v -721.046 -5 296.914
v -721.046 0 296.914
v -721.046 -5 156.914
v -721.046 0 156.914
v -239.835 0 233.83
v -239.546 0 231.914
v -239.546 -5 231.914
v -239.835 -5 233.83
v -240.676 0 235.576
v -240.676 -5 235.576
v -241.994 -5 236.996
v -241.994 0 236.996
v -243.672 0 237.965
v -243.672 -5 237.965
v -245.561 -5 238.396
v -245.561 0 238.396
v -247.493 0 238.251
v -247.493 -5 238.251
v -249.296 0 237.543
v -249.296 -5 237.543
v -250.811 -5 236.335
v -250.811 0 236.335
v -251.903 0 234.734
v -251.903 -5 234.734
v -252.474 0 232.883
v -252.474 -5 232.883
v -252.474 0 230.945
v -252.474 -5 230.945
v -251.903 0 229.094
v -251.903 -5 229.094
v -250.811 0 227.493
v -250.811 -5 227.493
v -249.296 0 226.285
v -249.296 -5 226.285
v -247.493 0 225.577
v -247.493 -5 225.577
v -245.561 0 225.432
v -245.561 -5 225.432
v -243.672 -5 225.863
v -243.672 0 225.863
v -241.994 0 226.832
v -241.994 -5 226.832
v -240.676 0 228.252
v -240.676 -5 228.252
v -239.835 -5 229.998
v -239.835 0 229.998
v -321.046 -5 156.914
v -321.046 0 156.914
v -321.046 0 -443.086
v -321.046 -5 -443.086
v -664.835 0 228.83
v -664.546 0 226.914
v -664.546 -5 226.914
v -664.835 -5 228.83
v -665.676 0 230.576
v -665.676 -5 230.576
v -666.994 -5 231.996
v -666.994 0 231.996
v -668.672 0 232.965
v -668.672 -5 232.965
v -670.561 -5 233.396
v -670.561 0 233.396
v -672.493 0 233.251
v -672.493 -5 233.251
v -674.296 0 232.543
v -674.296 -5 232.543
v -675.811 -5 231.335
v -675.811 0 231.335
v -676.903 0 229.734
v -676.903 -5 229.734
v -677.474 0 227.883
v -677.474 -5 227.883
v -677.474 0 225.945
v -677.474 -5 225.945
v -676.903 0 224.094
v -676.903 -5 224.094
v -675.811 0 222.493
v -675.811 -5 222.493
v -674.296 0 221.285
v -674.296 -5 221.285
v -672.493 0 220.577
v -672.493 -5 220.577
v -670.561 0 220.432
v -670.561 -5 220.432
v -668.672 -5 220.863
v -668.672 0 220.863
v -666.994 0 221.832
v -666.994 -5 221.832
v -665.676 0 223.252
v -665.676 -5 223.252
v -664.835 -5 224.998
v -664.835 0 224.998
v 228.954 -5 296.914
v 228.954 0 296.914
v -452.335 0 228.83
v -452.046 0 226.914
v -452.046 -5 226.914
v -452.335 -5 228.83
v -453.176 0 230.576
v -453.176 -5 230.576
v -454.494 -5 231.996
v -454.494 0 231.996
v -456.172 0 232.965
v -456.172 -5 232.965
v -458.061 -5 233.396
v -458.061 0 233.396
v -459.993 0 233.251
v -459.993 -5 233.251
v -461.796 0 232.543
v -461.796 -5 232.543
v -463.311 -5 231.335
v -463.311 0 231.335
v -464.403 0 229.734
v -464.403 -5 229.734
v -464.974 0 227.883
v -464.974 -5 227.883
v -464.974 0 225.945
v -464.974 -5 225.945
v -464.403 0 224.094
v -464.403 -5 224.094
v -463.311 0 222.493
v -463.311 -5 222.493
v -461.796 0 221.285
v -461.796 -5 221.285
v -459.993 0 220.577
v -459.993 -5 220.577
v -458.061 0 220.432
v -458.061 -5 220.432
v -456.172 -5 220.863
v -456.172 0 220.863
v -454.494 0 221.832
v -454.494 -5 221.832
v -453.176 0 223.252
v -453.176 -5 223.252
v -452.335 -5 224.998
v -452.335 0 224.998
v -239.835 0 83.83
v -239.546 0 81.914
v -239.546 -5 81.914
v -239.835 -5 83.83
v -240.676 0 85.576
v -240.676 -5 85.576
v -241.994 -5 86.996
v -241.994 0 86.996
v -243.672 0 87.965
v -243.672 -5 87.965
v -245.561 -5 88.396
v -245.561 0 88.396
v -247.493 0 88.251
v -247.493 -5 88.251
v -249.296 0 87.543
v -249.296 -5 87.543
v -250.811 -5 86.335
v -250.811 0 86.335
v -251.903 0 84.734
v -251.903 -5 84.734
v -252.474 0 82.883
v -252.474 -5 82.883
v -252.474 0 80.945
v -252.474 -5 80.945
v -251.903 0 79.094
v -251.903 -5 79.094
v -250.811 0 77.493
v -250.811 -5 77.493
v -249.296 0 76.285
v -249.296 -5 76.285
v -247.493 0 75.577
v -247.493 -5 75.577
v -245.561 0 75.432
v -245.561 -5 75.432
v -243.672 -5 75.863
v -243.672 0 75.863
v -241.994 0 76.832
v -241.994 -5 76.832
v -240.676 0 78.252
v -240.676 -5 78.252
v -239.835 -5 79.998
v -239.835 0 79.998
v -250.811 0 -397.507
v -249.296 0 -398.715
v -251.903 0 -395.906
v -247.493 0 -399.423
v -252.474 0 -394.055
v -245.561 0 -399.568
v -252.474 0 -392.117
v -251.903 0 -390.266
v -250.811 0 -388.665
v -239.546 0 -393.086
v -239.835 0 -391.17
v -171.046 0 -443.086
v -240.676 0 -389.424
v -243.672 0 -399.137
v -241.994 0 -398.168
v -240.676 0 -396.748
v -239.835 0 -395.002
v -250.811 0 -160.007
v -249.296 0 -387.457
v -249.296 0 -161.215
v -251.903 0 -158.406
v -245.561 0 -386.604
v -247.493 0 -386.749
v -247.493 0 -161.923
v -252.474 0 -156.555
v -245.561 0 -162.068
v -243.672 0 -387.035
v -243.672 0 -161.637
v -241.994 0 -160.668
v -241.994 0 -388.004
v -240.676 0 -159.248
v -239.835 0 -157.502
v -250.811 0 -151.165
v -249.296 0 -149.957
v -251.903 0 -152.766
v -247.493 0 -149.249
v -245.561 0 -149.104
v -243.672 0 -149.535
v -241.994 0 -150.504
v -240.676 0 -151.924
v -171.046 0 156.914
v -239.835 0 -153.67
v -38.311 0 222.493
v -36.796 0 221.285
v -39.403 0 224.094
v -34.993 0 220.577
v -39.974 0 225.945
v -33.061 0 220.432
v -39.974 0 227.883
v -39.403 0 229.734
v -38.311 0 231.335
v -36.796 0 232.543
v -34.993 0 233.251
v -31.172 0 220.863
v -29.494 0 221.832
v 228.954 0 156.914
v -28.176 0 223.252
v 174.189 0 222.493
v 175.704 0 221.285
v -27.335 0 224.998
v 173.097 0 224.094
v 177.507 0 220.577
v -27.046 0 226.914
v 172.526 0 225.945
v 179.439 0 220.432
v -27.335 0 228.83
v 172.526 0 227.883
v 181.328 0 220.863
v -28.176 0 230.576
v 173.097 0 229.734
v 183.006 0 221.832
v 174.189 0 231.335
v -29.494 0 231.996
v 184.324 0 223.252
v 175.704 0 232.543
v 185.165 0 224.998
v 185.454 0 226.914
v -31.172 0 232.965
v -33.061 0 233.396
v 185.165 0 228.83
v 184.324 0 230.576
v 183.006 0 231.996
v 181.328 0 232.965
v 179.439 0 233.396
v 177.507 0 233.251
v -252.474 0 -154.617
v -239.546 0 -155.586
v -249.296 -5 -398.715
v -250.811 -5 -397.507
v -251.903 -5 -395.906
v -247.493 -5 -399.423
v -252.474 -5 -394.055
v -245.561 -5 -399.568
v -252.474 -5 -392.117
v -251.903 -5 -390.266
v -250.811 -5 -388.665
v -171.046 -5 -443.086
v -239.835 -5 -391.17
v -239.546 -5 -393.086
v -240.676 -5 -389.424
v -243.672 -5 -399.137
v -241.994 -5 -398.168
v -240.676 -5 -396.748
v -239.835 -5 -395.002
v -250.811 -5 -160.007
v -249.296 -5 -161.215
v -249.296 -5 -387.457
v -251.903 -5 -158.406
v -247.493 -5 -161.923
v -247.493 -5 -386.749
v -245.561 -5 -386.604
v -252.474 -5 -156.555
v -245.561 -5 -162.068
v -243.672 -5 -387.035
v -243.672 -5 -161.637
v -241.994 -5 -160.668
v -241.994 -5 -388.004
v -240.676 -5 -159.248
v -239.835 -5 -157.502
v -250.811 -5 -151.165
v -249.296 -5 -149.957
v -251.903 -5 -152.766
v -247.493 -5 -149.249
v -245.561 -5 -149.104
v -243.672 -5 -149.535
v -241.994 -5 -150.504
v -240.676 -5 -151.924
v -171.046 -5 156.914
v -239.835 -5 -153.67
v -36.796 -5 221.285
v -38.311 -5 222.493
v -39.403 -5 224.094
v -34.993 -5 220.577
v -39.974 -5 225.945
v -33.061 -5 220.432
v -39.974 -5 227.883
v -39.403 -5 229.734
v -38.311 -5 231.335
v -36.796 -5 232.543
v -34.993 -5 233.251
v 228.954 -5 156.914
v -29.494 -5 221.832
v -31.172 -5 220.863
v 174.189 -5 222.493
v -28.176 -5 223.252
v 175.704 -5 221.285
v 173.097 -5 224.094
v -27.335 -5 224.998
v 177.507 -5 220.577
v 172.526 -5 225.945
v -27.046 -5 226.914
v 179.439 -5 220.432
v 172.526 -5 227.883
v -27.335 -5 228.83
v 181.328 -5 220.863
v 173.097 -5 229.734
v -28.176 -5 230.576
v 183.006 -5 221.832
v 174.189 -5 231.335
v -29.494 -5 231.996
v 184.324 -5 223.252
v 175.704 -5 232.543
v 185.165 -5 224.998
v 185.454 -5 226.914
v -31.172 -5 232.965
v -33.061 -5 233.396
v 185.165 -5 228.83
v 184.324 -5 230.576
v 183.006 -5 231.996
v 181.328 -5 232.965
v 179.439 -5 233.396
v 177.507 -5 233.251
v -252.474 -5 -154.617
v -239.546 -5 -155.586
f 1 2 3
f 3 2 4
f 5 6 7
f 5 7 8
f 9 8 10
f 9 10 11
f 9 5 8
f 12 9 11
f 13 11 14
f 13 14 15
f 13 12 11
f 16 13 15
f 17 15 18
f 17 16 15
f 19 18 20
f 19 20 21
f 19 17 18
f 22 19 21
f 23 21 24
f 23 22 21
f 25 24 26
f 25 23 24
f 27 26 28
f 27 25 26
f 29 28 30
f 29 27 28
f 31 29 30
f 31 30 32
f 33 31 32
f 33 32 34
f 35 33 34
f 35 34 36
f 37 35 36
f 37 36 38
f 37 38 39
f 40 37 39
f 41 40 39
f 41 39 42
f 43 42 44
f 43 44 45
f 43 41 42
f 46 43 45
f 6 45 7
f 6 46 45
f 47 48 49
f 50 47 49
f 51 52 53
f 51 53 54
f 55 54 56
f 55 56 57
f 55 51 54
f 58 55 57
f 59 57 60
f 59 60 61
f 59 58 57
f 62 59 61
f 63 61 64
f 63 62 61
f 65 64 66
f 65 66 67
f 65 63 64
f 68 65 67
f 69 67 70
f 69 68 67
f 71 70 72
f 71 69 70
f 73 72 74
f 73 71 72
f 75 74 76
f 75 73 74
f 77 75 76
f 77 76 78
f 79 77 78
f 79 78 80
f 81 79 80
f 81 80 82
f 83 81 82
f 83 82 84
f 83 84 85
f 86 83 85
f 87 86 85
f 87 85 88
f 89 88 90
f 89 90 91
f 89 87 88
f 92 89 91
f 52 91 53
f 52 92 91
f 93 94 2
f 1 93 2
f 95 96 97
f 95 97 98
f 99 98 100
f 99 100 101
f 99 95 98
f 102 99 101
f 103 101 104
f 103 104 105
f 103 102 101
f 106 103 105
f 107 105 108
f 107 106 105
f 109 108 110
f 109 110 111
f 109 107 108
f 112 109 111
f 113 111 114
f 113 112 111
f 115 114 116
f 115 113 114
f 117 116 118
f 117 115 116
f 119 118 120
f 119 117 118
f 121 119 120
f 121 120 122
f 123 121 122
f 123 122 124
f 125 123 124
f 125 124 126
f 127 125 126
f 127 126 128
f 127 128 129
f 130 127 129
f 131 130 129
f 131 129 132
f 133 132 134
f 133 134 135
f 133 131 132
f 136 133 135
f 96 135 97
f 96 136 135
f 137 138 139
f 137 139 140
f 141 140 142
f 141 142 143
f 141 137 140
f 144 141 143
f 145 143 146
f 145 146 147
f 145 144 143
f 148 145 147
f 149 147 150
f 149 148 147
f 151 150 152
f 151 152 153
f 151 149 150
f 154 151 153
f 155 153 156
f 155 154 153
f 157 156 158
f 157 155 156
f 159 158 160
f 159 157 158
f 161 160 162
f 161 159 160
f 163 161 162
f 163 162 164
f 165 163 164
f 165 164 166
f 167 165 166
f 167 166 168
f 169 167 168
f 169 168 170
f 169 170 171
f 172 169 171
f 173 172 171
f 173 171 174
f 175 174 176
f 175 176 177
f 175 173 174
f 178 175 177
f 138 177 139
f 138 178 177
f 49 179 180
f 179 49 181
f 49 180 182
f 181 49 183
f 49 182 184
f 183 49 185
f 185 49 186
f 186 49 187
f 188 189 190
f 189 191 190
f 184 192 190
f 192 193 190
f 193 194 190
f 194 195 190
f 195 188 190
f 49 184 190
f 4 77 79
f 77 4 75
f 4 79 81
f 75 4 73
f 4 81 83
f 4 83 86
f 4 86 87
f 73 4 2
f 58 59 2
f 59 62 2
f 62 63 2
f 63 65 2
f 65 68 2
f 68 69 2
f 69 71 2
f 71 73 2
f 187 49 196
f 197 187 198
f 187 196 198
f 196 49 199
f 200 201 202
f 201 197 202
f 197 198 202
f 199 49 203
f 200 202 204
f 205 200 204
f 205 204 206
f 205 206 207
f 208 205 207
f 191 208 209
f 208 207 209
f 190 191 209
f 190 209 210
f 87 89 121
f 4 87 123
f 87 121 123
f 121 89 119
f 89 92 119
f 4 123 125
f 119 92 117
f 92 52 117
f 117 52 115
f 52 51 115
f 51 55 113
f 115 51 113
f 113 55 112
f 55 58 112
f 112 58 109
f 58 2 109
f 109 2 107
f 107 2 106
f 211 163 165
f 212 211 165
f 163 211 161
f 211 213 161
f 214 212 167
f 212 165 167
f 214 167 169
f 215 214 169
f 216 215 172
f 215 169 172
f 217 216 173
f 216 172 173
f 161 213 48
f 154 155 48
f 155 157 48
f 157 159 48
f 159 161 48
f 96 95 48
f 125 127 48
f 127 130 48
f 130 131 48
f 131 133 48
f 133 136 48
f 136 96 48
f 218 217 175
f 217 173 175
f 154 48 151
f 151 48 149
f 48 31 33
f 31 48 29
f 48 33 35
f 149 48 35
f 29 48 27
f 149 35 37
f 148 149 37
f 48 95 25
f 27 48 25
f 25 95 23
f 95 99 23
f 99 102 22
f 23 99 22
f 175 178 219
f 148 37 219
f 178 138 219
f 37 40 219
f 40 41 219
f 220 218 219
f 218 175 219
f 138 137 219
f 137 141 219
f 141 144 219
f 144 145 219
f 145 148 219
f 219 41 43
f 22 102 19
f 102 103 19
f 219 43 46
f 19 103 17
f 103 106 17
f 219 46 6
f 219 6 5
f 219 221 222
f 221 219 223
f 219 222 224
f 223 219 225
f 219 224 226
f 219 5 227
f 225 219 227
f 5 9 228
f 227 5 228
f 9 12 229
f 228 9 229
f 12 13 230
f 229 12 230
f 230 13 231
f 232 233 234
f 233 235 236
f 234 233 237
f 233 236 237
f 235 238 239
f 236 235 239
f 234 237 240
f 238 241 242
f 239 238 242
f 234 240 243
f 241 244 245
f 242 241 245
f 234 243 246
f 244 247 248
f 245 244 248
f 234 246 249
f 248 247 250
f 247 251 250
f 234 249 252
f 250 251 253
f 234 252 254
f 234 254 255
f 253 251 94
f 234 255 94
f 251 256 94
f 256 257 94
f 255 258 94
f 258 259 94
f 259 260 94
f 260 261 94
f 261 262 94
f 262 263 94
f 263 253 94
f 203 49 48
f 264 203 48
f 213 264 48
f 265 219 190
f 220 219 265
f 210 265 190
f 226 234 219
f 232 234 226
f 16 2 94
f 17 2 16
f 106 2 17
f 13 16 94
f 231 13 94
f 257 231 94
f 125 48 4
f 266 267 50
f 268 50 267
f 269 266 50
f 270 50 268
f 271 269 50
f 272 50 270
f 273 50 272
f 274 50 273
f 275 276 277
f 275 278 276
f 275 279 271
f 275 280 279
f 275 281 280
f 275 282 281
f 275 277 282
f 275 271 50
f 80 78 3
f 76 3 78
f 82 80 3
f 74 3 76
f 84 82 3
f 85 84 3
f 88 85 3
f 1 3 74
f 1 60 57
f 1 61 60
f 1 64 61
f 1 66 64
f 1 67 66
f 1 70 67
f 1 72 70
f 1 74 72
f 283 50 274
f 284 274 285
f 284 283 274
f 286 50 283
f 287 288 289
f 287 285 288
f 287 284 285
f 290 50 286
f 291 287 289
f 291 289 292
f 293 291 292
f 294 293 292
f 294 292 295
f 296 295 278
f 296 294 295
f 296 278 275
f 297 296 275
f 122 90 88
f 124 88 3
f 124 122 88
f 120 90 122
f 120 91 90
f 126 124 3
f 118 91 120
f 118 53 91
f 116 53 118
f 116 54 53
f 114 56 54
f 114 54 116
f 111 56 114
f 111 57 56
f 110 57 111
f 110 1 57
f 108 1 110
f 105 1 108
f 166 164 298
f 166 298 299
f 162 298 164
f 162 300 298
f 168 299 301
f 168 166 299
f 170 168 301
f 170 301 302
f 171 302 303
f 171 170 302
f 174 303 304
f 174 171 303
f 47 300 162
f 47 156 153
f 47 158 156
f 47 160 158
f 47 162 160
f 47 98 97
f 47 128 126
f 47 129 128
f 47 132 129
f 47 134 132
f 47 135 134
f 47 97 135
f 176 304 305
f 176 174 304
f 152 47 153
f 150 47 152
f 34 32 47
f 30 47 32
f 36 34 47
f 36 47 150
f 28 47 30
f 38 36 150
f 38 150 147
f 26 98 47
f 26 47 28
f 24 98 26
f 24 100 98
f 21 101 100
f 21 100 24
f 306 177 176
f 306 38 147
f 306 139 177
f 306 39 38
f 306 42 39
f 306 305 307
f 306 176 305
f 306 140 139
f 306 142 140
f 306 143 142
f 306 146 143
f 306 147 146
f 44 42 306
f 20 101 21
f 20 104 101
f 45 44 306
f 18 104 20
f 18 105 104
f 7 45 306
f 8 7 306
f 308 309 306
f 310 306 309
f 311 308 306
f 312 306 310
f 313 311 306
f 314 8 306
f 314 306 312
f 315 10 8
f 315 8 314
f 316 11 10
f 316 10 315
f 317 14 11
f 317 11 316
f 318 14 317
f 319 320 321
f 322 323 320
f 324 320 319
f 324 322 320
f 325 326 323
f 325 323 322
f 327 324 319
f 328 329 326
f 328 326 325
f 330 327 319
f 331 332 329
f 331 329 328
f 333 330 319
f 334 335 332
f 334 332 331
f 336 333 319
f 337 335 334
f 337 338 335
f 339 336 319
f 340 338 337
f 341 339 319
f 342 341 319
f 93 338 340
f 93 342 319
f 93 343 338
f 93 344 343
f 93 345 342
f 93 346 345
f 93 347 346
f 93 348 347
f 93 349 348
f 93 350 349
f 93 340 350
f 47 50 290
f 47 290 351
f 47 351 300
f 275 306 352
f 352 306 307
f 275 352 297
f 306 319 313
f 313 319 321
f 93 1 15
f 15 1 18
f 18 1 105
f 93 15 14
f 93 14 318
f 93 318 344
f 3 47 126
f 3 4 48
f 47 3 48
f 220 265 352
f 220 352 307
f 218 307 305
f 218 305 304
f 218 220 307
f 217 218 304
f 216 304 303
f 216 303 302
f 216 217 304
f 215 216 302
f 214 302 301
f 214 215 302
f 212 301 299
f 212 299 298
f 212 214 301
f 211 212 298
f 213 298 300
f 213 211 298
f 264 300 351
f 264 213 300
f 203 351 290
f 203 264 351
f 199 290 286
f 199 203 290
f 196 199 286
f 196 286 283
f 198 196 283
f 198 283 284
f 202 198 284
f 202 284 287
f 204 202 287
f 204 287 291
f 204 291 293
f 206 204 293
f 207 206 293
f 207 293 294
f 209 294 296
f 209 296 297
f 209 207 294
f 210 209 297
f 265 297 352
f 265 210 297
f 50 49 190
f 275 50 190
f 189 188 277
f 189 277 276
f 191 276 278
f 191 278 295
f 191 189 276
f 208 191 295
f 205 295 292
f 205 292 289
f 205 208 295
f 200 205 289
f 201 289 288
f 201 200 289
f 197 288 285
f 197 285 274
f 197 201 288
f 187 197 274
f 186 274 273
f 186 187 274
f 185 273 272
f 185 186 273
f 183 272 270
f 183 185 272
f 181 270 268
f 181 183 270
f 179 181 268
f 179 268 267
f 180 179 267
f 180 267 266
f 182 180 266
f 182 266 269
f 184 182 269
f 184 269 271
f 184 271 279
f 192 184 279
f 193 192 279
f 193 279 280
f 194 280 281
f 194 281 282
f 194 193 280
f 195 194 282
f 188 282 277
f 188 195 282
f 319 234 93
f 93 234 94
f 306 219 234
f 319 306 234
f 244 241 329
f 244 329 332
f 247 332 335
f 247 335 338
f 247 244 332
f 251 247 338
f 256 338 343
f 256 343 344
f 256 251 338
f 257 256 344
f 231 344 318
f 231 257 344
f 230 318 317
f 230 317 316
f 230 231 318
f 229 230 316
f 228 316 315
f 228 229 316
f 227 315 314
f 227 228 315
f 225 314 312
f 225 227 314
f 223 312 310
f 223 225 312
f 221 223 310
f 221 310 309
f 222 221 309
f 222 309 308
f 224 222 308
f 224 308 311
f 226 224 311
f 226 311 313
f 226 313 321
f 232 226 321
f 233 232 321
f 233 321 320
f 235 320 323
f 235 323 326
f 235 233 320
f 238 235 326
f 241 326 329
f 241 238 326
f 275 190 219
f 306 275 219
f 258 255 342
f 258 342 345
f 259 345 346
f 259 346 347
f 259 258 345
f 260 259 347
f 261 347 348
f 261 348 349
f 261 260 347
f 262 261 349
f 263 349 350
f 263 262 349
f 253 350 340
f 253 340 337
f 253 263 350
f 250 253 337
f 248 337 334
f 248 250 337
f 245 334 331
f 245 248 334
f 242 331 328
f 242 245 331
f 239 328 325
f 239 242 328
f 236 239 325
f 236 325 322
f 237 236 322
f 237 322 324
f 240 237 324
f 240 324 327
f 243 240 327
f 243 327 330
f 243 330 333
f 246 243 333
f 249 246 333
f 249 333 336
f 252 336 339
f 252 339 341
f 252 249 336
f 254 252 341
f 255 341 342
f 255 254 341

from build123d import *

# Parameters (mm, degrees)
F0_R     = 6.5
F1_DEPTH = 5


with BuildPart() as f1:
    # F0 (on Front) → F1 (new body)
    with BuildSketch(Plane.XZ):
        Polygon((-321.046383, 156.913972), (-321.046383, -443.086028), (-171.046383, -443.086028), (-171.046383, 156.913972), (228.953617, 156.913972), (228.953617, 296.913972), (-721.046383, 296.913972), (-721.046383, 156.913972), align=None)
        with Locations((-246.046383, -393.086028)):
            Circle(F0_R, mode=Mode.SUBTRACT)
        with Locations((-246.046383, -155.586028)):
            Circle(F0_R, mode=Mode.SUBTRACT)
        with Locations((-671.046383, 226.913972)):
            Circle(F0_R, mode=Mode.SUBTRACT)
        with Locations((-458.546383, 226.913972)):
            Circle(F0_R, mode=Mode.SUBTRACT)
        with Locations((-246.046383, 81.913972)):
            Circle(F0_R, mode=Mode.SUBTRACT)
        with Locations((-246.046383, 231.913972)):
            Circle(F0_R, mode=Mode.SUBTRACT)
        with Locations((-33.546383, 226.913972)):
            Circle(F0_R, mode=Mode.SUBTRACT)
        with Locations((178.953617, 226.913972)):
            Circle(F0_R, mode=Mode.SUBTRACT)
    extrude(amount=F1_DEPTH)


solid = f1.part
